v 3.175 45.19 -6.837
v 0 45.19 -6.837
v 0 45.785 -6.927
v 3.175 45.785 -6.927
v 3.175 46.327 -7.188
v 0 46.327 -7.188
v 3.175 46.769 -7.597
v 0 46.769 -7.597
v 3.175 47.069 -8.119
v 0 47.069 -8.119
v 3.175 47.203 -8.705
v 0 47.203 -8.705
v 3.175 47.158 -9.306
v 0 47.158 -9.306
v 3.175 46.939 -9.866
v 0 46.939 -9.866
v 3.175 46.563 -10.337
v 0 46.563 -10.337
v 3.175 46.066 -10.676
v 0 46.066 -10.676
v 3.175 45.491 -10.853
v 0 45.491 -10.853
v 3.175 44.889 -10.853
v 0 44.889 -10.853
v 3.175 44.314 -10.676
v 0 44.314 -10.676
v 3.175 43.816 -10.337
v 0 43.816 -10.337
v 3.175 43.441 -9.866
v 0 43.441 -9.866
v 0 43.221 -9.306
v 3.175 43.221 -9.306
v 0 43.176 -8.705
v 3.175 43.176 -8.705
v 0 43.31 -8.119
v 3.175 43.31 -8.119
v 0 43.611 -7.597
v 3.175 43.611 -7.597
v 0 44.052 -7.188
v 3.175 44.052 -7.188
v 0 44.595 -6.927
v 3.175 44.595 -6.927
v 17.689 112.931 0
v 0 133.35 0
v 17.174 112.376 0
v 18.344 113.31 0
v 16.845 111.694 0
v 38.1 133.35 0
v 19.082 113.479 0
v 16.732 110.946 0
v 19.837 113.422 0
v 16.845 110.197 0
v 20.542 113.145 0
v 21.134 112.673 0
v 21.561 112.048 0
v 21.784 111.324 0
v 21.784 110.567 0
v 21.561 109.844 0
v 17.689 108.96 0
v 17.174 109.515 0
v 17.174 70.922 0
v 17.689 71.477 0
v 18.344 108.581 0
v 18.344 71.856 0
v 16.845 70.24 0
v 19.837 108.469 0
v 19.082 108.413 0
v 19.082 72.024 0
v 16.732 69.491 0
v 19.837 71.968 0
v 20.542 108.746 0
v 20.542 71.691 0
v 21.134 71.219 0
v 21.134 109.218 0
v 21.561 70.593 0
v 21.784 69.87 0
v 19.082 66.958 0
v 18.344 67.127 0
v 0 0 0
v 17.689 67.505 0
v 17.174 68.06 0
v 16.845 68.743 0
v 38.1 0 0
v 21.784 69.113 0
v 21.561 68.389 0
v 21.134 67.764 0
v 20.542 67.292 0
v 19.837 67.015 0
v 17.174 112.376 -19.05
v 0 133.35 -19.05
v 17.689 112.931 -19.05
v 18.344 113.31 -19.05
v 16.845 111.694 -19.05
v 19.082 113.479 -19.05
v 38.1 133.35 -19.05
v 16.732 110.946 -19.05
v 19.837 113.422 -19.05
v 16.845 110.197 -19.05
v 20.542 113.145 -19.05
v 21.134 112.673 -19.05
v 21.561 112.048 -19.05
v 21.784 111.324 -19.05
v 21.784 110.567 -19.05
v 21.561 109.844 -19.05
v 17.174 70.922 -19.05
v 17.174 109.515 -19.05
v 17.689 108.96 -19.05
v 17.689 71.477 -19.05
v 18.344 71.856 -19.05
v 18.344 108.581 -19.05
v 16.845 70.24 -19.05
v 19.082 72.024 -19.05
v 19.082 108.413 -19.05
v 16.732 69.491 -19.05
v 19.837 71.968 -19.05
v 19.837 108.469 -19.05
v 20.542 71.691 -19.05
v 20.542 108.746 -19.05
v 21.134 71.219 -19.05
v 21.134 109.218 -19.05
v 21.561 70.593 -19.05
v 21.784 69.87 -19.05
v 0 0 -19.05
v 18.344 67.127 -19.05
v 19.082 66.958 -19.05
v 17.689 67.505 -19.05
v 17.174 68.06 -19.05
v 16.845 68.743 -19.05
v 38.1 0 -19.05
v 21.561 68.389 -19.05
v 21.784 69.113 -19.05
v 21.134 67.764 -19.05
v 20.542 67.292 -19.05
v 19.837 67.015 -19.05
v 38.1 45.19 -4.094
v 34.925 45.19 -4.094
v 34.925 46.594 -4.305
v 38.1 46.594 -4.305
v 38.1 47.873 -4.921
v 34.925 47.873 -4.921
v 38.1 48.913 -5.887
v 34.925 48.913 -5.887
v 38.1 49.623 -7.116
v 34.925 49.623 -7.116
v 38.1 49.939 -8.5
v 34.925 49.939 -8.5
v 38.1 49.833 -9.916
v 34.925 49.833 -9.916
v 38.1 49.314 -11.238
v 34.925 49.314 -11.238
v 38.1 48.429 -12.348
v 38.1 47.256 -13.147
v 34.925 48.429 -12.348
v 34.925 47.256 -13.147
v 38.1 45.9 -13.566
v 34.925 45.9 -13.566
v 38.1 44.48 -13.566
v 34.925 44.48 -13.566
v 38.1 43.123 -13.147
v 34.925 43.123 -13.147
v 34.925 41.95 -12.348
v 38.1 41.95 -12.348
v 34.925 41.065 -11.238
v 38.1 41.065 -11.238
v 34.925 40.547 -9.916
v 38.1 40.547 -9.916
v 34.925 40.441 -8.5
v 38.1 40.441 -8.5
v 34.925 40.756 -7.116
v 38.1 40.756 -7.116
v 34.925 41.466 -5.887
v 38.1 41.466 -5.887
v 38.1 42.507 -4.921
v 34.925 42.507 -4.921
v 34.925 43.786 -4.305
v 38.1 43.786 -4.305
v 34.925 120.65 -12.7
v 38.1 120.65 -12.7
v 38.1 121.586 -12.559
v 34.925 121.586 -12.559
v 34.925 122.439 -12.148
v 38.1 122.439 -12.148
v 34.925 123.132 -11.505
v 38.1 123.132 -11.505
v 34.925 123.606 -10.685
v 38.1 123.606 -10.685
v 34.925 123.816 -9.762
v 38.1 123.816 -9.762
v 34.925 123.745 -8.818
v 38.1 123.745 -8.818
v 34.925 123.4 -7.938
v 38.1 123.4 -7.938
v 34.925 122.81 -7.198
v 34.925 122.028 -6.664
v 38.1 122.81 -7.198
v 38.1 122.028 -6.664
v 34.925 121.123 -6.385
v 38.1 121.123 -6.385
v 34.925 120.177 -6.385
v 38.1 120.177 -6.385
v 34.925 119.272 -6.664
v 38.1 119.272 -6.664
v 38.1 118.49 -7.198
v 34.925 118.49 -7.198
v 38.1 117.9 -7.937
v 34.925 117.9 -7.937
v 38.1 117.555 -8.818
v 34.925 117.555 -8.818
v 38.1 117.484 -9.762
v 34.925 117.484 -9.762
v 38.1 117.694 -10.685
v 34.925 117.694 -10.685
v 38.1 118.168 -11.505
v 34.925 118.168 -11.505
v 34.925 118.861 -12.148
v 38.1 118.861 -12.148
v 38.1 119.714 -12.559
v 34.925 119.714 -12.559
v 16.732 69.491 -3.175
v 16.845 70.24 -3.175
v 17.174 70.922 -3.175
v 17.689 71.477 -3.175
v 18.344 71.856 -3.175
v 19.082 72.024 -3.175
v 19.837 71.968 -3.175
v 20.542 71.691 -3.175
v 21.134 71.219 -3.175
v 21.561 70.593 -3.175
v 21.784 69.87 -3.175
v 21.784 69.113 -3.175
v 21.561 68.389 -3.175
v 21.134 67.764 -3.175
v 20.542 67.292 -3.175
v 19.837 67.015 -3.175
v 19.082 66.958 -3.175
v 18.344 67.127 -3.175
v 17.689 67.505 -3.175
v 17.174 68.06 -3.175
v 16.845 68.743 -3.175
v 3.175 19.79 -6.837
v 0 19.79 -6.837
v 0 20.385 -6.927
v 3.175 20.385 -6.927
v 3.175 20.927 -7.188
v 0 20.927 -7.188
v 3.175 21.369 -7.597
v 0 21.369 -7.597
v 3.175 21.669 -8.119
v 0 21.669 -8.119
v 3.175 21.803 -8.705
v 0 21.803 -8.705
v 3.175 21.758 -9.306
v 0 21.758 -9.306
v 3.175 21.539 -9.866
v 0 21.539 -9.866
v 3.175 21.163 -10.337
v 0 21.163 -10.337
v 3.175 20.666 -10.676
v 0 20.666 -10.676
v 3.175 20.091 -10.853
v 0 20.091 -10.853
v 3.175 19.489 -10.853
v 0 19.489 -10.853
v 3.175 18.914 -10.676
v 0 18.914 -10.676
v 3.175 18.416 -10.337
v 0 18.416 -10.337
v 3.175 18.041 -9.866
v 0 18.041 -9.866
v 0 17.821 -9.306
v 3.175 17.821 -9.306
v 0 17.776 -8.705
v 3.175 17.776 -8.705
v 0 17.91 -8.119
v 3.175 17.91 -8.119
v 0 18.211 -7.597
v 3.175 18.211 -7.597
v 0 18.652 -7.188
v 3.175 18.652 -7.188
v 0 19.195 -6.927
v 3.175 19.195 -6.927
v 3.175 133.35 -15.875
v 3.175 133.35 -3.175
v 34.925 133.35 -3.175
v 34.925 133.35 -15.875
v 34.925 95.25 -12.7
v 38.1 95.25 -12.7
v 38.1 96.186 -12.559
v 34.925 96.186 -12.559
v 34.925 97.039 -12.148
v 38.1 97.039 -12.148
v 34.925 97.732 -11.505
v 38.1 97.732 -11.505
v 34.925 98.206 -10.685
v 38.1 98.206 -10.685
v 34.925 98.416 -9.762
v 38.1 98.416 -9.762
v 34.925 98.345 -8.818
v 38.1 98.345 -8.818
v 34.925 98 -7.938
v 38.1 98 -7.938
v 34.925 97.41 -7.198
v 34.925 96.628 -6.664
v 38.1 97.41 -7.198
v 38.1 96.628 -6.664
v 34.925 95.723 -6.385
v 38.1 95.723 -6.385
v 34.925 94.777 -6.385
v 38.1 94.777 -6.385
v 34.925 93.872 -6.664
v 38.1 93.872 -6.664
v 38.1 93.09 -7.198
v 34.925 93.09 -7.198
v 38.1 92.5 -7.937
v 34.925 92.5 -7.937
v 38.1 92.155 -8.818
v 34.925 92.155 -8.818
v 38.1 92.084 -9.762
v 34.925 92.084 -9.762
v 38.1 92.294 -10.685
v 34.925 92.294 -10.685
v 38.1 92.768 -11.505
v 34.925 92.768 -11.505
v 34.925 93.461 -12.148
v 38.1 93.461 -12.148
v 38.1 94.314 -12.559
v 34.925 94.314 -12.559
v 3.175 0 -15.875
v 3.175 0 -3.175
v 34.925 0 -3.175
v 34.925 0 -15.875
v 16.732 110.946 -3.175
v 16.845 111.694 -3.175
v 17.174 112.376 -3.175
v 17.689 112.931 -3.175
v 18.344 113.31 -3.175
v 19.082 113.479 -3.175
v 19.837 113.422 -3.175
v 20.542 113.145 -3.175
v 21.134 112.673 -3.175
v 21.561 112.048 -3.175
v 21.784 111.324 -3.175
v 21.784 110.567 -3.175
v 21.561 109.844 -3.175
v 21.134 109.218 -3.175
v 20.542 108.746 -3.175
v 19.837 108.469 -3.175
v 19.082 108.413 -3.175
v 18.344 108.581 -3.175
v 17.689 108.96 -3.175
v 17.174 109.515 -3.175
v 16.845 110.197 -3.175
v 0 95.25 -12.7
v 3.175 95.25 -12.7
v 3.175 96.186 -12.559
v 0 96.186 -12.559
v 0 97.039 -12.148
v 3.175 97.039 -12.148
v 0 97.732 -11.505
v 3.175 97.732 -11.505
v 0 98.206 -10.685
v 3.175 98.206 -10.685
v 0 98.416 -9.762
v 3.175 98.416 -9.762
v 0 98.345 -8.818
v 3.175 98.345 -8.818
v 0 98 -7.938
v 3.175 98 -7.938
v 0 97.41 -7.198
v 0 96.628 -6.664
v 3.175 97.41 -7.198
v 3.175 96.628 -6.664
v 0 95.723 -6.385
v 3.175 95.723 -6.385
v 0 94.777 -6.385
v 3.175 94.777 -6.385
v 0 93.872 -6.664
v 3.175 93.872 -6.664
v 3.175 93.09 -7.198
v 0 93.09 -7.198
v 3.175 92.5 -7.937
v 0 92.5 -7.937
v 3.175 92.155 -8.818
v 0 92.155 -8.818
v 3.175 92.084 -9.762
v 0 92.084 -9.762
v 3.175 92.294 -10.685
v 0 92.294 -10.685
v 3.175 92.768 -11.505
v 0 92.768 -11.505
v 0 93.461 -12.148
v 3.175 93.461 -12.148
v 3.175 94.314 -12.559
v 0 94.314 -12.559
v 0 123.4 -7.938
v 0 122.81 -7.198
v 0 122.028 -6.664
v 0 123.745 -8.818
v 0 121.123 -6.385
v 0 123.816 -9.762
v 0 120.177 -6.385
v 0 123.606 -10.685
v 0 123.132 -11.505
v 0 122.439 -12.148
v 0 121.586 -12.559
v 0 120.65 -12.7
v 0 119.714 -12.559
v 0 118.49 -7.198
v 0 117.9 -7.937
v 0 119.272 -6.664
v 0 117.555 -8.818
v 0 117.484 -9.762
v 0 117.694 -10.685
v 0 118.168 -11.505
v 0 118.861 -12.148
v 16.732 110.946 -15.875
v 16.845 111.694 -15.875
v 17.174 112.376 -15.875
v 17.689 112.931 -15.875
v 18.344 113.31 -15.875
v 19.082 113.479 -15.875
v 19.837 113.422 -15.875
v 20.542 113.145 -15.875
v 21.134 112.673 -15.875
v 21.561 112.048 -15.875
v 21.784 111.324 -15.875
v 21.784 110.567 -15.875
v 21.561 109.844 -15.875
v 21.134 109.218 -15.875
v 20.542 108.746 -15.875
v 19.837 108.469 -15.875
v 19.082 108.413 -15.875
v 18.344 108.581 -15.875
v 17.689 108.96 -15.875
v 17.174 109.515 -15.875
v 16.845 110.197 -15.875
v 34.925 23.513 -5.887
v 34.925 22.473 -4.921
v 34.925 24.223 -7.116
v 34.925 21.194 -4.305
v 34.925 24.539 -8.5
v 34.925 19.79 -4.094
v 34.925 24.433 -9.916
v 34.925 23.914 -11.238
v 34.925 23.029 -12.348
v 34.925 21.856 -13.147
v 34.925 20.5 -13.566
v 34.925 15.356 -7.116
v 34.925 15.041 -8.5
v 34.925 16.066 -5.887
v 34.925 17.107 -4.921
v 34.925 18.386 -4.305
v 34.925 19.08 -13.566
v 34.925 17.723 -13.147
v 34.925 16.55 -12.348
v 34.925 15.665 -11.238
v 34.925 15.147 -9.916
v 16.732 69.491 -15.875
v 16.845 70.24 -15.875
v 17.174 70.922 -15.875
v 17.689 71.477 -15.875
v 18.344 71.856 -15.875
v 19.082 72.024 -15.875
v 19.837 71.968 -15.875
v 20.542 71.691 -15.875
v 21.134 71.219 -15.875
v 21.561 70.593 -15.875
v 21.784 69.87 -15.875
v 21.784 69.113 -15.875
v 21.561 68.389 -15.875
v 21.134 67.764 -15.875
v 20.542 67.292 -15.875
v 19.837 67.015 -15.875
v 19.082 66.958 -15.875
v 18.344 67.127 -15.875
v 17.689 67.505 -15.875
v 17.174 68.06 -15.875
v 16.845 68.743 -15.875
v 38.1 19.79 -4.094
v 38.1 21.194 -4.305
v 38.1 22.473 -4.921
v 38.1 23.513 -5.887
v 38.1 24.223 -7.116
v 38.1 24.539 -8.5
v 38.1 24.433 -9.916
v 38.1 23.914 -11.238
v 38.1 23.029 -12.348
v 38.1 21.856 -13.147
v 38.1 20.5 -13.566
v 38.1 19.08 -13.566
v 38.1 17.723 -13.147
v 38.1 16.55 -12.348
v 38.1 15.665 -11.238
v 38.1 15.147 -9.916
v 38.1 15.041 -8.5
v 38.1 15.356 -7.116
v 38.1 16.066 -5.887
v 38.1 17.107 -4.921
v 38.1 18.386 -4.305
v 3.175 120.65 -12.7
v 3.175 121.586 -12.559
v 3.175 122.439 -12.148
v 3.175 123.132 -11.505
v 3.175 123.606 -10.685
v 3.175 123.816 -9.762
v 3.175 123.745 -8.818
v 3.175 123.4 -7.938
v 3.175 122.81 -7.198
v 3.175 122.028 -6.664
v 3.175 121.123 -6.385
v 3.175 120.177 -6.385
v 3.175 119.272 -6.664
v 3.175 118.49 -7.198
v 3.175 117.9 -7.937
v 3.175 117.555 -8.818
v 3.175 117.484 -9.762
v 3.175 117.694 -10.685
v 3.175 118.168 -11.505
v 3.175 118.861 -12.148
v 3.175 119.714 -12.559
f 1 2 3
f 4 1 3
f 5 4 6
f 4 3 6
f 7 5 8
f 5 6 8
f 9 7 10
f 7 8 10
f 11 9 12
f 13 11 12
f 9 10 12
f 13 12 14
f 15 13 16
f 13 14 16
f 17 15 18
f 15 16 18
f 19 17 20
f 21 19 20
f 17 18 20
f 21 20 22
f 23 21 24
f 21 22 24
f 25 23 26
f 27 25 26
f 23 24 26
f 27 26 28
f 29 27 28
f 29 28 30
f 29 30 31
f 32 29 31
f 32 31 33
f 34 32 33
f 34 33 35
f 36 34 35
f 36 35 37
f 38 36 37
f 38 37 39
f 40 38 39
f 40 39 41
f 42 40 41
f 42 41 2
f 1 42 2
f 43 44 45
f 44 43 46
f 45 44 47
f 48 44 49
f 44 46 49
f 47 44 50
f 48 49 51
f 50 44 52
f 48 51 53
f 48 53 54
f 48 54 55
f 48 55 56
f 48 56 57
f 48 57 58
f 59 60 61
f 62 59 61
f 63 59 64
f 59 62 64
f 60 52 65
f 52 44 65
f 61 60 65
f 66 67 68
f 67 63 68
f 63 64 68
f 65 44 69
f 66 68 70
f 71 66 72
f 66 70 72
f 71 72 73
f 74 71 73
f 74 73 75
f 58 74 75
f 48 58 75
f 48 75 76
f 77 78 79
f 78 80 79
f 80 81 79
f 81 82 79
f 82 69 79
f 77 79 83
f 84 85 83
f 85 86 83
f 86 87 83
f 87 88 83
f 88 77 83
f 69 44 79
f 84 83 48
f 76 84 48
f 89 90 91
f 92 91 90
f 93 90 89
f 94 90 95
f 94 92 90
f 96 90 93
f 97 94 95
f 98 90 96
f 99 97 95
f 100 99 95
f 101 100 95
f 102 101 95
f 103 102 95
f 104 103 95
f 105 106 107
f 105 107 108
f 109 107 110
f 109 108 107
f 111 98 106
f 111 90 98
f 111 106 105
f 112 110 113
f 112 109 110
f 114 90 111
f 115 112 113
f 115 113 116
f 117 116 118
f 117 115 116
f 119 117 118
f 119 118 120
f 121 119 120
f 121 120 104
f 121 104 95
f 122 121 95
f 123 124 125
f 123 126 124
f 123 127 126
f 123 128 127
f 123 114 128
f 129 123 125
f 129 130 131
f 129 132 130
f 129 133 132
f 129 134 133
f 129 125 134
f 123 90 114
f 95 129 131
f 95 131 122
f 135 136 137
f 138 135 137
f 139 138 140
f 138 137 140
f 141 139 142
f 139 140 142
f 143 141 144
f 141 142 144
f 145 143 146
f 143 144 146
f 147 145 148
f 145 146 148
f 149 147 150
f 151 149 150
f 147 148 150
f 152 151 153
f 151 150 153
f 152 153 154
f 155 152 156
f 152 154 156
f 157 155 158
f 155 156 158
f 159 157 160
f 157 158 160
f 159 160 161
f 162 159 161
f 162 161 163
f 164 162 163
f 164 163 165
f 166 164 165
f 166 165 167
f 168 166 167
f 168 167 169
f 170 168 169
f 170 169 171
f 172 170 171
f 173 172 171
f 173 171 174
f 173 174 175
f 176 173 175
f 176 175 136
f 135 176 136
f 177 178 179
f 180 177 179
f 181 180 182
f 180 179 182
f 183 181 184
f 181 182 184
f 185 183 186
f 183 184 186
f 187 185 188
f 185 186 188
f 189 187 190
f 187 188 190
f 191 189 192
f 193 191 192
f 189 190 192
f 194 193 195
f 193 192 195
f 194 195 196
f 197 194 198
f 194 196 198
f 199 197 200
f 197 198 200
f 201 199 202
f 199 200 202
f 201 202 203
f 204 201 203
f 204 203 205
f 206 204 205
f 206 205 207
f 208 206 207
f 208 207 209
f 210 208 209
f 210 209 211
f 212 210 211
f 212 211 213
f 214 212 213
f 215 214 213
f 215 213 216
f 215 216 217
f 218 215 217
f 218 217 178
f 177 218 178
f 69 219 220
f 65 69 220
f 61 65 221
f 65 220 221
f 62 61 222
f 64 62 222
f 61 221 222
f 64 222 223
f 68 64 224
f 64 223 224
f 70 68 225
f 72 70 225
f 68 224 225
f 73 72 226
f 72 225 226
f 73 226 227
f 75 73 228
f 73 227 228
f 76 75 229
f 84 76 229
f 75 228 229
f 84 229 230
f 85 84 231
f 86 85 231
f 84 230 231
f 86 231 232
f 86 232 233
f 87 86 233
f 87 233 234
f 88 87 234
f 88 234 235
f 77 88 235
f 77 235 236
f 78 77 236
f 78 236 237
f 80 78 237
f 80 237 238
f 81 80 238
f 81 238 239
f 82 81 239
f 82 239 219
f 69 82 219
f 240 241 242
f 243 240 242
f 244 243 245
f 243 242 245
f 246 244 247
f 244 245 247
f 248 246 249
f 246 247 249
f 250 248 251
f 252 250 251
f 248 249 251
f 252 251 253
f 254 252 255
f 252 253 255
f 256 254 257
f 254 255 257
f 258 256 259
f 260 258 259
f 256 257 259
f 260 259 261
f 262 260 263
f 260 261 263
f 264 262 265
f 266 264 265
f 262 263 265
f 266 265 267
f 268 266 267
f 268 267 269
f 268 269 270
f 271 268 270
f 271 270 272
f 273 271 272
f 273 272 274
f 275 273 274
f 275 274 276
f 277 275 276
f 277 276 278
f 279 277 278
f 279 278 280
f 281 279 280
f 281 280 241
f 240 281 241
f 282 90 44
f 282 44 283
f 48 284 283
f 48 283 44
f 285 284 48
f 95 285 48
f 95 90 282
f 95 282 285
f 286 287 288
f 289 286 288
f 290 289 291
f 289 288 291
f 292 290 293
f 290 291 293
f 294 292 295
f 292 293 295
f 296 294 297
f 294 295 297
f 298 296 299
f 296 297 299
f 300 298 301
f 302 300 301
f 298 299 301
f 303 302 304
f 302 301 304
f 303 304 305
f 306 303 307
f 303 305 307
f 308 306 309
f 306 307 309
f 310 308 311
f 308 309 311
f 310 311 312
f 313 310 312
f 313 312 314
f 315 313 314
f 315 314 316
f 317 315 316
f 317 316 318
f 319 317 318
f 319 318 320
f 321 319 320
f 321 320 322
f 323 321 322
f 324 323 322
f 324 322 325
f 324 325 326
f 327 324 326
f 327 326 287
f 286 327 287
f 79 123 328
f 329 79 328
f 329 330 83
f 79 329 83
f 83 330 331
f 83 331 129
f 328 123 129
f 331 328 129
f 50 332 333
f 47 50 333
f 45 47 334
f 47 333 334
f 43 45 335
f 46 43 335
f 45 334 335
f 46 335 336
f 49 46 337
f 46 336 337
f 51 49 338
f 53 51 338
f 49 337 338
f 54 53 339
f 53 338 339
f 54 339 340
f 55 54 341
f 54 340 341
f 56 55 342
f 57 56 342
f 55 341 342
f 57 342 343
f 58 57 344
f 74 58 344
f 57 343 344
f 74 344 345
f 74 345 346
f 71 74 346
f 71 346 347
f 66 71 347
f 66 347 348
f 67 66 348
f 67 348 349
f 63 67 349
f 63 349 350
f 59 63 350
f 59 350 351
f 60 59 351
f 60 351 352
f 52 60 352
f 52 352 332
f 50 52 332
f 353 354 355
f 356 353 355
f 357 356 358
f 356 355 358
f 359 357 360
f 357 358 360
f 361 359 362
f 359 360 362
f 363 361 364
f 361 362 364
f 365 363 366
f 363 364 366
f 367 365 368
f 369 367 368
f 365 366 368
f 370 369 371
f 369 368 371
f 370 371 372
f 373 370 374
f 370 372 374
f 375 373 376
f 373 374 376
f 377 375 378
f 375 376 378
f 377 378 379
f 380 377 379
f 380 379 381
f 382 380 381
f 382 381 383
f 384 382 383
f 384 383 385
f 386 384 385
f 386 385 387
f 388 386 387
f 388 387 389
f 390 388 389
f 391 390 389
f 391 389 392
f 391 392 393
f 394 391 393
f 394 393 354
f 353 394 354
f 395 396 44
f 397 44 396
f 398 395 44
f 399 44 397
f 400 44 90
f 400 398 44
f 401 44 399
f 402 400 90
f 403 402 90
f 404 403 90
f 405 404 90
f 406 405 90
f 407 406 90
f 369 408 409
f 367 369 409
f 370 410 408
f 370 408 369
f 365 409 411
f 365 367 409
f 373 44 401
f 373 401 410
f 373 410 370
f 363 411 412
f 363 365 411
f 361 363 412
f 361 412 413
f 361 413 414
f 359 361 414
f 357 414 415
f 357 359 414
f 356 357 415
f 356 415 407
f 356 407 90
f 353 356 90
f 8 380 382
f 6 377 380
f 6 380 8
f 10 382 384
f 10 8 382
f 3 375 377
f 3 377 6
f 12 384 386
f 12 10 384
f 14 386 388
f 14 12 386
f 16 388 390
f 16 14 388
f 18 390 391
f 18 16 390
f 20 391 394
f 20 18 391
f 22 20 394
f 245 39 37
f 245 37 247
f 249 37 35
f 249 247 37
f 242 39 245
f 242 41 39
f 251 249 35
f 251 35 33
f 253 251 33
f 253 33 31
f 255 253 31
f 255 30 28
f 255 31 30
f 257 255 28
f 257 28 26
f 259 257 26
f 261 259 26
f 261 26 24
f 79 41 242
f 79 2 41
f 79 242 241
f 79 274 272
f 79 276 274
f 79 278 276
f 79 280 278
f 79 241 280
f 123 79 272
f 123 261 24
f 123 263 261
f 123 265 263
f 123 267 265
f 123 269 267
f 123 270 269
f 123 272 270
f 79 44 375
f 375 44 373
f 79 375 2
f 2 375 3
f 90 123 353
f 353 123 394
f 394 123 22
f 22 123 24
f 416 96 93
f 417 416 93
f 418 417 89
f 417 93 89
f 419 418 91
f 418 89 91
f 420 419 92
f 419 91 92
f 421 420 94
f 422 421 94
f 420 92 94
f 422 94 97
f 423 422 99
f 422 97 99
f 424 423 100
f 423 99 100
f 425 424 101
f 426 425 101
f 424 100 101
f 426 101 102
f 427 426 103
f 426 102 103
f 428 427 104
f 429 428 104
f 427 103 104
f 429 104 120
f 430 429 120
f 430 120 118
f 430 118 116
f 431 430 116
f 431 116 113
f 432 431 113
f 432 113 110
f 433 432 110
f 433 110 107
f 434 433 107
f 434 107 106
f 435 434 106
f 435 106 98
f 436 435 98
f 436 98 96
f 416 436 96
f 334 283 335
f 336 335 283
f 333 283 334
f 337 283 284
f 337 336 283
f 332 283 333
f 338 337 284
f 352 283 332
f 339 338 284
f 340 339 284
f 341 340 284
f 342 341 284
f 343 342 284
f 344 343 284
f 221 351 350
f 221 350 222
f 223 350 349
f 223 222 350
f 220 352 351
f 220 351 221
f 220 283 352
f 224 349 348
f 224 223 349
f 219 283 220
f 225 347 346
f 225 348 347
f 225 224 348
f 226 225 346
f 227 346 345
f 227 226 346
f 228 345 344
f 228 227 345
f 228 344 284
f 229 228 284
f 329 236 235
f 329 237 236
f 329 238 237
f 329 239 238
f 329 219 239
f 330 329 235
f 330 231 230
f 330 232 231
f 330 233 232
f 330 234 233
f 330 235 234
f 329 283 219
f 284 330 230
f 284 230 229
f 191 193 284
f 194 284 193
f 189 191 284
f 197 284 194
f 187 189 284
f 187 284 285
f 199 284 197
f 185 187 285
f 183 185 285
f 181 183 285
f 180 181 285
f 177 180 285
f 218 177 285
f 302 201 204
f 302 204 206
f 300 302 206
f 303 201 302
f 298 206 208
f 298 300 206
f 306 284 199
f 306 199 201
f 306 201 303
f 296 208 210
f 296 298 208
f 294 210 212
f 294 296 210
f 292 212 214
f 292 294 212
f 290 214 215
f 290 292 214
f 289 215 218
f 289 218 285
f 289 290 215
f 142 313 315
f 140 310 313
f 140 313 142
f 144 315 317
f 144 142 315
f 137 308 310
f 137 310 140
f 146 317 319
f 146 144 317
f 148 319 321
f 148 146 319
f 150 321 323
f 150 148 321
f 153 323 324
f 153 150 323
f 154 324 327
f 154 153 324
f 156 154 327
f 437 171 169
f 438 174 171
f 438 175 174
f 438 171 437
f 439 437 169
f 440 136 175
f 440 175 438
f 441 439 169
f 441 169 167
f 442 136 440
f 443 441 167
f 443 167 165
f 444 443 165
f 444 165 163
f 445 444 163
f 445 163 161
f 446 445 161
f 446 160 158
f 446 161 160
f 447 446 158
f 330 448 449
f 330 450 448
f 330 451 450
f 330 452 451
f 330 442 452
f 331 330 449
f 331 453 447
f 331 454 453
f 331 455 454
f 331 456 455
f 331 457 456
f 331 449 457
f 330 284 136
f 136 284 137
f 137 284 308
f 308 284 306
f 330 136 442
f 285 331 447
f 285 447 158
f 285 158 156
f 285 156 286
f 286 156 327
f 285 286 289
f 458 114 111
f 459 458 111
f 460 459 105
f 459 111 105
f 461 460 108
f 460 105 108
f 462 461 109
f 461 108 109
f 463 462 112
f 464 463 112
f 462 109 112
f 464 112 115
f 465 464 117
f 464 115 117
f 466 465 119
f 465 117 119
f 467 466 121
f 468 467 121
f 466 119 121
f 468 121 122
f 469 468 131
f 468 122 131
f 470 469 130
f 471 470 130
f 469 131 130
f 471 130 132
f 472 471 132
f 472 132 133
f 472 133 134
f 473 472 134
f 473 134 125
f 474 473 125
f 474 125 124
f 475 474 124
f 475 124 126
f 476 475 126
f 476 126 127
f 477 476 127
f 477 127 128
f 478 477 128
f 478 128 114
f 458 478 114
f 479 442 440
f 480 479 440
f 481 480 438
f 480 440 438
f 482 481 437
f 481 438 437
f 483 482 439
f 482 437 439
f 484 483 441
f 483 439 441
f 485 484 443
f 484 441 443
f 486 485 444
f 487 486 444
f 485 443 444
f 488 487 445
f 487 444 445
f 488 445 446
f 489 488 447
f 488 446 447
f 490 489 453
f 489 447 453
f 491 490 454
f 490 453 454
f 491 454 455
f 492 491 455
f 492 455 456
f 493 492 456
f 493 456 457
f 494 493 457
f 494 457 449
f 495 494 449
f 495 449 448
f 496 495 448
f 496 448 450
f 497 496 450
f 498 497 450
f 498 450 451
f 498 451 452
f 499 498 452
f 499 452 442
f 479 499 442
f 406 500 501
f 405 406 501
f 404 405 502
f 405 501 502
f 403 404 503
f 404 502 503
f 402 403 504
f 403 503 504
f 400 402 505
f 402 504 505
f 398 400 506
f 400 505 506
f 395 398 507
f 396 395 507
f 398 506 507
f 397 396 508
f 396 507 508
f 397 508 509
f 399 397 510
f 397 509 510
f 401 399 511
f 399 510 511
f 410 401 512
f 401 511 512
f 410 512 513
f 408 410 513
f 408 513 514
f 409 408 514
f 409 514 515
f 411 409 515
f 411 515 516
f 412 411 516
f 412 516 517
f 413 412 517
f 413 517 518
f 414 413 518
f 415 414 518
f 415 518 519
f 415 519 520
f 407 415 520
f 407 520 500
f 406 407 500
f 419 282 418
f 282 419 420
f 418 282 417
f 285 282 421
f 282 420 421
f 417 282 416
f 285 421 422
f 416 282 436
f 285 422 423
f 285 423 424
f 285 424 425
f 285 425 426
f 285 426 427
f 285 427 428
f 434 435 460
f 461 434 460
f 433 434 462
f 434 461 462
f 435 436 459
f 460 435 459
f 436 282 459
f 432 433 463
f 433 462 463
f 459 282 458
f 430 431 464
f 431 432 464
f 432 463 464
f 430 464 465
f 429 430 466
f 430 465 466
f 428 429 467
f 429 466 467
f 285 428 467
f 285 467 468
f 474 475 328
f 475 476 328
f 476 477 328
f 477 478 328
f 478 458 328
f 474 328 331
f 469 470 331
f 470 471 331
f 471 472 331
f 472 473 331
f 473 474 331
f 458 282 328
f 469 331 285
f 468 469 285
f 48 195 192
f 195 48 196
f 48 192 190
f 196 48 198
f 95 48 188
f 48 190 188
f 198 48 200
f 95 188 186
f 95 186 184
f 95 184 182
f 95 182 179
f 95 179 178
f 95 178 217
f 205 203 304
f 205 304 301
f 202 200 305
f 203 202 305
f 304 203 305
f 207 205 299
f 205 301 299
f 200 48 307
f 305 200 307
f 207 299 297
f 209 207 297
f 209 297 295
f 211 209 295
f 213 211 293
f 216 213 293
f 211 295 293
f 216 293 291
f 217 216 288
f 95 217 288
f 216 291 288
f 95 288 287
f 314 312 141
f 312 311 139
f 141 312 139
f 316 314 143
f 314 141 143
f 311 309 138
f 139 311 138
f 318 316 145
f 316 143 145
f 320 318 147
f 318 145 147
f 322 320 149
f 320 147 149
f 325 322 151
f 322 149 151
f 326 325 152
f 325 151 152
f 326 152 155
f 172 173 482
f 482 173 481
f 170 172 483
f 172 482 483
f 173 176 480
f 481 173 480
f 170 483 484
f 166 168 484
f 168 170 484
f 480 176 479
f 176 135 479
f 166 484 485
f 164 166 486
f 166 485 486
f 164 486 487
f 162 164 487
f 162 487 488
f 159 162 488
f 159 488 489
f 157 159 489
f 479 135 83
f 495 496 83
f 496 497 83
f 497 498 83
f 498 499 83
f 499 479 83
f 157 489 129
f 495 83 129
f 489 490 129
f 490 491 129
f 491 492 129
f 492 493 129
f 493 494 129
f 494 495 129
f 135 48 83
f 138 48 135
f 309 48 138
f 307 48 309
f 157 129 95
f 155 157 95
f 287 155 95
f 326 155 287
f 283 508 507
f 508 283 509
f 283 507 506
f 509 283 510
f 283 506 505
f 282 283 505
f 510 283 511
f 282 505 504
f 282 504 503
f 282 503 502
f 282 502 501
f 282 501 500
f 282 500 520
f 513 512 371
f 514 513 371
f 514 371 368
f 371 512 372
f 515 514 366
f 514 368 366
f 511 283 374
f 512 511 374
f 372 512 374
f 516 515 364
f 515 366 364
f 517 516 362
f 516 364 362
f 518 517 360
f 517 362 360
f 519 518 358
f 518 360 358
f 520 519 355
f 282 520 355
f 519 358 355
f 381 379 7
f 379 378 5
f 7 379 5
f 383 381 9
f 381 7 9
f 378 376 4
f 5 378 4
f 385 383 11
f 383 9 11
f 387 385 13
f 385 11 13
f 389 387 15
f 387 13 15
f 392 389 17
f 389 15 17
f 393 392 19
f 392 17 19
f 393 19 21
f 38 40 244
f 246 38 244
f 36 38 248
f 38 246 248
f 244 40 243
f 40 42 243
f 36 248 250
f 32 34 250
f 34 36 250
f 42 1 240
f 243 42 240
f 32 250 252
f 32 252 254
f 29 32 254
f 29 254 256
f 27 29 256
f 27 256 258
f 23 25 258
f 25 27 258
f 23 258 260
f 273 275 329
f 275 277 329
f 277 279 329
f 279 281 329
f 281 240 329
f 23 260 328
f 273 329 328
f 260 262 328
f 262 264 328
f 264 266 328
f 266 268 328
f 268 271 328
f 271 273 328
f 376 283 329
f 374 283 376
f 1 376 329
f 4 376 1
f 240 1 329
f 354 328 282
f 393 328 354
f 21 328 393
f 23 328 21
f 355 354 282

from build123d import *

# Parameters (mm, degrees)
SKETCH1_W           = 38.1
SKETCH1_H           = 19.05
SKETCH1_W_2         = 31.75
SKETCH1_H_2         = 12.7
BOSS_EXTRUDE1_DEPTH = 133.35
SKETCH2_R           = 3.175
CUT_EXTRUDE1_DEPTH  = 39.1
SKETCH3_R           = 2.0193
CUT_EXTRUDE2_DEPTH  = 39.1
CUT_EXTRUDE3_REACH  = 5.175
SKETCH4_R           = 4.7625
SKETCH5_R           = 2.54
CUT_EXTRUDE4_DEPTH  = 20.05


with BuildPart() as part:
    # Sketch1 → Boss-Extrude1 (new body)
    with BuildSketch(Plane(origin=(0, 0, 0), x_dir=(1, 0, 0), z_dir=(0, 1, 0))):
        with Locations((19.05, 9.525)):
            Rectangle(SKETCH1_W, SKETCH1_H)
        with Locations((19.05, 9.525)):
            Rectangle(SKETCH1_W_2, SKETCH1_H_2, mode=Mode.SUBTRACT)
    extrude(amount=BOSS_EXTRUDE1_DEPTH)

    # Sketch2 → Cut-Extrude1 (cut, through all)
    with BuildSketch(Plane(origin=(38.1, 0, 0), x_dir=(0, 0, -1), z_dir=(1, 0, 0))):
        with Locations((9.525, 95.25)):
            Circle(SKETCH2_R)
        with Locations((9.525, 120.65)):
            Circle(SKETCH2_R)
    extrude(amount=-CUT_EXTRUDE1_DEPTH, mode=Mode.SUBTRACT)

    # Sketch3 → Cut-Extrude2 (cut, through all)
    with BuildSketch(Plane.ZY):
        with Locations((-8.8564, 19.789753907)):
            Circle(SKETCH3_R)
        with Locations((-8.8564, 45.189753907)):
            Circle(SKETCH3_R)
    extrude(amount=-CUT_EXTRUDE2_DEPTH, mode=Mode.SUBTRACT)

    # Sketch4 → Cut-Extrude3 (cut, up to next)
    with BuildSketch(Plane.ZY.offset(-34.925), mode=Mode.PRIVATE) as cut_extrude3_sk1:
        with Locations((-8.8564, 45.189753907)):
            Circle(SKETCH4_R)
    cut_extrude3_tool1 = extrude(cut_extrude3_sk1.sketch, amount=-CUT_EXTRUDE3_REACH, mode=Mode.PRIVATE) & part.part
    add(cut_extrude3_tool1.solids().sort_by_distance((34.925, 45.189754, -8.8564))[0], mode=Mode.SUBTRACT)
    # Sketch4 → Cut-Extrude3 (cut, up to next)
    with BuildSketch(Plane.ZY.offset(-34.925), mode=Mode.PRIVATE) as cut_extrude3_sk2:
        with Locations((-8.8564, 19.789753907)):
            Circle(SKETCH4_R)
    cut_extrude3_tool2 = extrude(cut_extrude3_sk2.sketch, amount=-CUT_EXTRUDE3_REACH, mode=Mode.PRIVATE) & part.part
    add(cut_extrude3_tool2.solids().sort_by_distance((34.925, 19.789754, -8.8564))[0], mode=Mode.SUBTRACT)

    # Sketch5 → Cut-Extrude4 (cut, through all)
    with BuildSketch(Plane(origin=(0, 0, -19.05), x_dir=(-1, 0, 0), z_dir=(0, 0, -1))):
        with Locations((-19.272235529, 69.491227214)):
            Circle(SKETCH5_R)
        with Locations((-19.272235529, 110.945613607)):
            Circle(SKETCH5_R)
    extrude(amount=-CUT_EXTRUDE4_DEPTH, mode=Mode.SUBTRACT)


solid = part.part
